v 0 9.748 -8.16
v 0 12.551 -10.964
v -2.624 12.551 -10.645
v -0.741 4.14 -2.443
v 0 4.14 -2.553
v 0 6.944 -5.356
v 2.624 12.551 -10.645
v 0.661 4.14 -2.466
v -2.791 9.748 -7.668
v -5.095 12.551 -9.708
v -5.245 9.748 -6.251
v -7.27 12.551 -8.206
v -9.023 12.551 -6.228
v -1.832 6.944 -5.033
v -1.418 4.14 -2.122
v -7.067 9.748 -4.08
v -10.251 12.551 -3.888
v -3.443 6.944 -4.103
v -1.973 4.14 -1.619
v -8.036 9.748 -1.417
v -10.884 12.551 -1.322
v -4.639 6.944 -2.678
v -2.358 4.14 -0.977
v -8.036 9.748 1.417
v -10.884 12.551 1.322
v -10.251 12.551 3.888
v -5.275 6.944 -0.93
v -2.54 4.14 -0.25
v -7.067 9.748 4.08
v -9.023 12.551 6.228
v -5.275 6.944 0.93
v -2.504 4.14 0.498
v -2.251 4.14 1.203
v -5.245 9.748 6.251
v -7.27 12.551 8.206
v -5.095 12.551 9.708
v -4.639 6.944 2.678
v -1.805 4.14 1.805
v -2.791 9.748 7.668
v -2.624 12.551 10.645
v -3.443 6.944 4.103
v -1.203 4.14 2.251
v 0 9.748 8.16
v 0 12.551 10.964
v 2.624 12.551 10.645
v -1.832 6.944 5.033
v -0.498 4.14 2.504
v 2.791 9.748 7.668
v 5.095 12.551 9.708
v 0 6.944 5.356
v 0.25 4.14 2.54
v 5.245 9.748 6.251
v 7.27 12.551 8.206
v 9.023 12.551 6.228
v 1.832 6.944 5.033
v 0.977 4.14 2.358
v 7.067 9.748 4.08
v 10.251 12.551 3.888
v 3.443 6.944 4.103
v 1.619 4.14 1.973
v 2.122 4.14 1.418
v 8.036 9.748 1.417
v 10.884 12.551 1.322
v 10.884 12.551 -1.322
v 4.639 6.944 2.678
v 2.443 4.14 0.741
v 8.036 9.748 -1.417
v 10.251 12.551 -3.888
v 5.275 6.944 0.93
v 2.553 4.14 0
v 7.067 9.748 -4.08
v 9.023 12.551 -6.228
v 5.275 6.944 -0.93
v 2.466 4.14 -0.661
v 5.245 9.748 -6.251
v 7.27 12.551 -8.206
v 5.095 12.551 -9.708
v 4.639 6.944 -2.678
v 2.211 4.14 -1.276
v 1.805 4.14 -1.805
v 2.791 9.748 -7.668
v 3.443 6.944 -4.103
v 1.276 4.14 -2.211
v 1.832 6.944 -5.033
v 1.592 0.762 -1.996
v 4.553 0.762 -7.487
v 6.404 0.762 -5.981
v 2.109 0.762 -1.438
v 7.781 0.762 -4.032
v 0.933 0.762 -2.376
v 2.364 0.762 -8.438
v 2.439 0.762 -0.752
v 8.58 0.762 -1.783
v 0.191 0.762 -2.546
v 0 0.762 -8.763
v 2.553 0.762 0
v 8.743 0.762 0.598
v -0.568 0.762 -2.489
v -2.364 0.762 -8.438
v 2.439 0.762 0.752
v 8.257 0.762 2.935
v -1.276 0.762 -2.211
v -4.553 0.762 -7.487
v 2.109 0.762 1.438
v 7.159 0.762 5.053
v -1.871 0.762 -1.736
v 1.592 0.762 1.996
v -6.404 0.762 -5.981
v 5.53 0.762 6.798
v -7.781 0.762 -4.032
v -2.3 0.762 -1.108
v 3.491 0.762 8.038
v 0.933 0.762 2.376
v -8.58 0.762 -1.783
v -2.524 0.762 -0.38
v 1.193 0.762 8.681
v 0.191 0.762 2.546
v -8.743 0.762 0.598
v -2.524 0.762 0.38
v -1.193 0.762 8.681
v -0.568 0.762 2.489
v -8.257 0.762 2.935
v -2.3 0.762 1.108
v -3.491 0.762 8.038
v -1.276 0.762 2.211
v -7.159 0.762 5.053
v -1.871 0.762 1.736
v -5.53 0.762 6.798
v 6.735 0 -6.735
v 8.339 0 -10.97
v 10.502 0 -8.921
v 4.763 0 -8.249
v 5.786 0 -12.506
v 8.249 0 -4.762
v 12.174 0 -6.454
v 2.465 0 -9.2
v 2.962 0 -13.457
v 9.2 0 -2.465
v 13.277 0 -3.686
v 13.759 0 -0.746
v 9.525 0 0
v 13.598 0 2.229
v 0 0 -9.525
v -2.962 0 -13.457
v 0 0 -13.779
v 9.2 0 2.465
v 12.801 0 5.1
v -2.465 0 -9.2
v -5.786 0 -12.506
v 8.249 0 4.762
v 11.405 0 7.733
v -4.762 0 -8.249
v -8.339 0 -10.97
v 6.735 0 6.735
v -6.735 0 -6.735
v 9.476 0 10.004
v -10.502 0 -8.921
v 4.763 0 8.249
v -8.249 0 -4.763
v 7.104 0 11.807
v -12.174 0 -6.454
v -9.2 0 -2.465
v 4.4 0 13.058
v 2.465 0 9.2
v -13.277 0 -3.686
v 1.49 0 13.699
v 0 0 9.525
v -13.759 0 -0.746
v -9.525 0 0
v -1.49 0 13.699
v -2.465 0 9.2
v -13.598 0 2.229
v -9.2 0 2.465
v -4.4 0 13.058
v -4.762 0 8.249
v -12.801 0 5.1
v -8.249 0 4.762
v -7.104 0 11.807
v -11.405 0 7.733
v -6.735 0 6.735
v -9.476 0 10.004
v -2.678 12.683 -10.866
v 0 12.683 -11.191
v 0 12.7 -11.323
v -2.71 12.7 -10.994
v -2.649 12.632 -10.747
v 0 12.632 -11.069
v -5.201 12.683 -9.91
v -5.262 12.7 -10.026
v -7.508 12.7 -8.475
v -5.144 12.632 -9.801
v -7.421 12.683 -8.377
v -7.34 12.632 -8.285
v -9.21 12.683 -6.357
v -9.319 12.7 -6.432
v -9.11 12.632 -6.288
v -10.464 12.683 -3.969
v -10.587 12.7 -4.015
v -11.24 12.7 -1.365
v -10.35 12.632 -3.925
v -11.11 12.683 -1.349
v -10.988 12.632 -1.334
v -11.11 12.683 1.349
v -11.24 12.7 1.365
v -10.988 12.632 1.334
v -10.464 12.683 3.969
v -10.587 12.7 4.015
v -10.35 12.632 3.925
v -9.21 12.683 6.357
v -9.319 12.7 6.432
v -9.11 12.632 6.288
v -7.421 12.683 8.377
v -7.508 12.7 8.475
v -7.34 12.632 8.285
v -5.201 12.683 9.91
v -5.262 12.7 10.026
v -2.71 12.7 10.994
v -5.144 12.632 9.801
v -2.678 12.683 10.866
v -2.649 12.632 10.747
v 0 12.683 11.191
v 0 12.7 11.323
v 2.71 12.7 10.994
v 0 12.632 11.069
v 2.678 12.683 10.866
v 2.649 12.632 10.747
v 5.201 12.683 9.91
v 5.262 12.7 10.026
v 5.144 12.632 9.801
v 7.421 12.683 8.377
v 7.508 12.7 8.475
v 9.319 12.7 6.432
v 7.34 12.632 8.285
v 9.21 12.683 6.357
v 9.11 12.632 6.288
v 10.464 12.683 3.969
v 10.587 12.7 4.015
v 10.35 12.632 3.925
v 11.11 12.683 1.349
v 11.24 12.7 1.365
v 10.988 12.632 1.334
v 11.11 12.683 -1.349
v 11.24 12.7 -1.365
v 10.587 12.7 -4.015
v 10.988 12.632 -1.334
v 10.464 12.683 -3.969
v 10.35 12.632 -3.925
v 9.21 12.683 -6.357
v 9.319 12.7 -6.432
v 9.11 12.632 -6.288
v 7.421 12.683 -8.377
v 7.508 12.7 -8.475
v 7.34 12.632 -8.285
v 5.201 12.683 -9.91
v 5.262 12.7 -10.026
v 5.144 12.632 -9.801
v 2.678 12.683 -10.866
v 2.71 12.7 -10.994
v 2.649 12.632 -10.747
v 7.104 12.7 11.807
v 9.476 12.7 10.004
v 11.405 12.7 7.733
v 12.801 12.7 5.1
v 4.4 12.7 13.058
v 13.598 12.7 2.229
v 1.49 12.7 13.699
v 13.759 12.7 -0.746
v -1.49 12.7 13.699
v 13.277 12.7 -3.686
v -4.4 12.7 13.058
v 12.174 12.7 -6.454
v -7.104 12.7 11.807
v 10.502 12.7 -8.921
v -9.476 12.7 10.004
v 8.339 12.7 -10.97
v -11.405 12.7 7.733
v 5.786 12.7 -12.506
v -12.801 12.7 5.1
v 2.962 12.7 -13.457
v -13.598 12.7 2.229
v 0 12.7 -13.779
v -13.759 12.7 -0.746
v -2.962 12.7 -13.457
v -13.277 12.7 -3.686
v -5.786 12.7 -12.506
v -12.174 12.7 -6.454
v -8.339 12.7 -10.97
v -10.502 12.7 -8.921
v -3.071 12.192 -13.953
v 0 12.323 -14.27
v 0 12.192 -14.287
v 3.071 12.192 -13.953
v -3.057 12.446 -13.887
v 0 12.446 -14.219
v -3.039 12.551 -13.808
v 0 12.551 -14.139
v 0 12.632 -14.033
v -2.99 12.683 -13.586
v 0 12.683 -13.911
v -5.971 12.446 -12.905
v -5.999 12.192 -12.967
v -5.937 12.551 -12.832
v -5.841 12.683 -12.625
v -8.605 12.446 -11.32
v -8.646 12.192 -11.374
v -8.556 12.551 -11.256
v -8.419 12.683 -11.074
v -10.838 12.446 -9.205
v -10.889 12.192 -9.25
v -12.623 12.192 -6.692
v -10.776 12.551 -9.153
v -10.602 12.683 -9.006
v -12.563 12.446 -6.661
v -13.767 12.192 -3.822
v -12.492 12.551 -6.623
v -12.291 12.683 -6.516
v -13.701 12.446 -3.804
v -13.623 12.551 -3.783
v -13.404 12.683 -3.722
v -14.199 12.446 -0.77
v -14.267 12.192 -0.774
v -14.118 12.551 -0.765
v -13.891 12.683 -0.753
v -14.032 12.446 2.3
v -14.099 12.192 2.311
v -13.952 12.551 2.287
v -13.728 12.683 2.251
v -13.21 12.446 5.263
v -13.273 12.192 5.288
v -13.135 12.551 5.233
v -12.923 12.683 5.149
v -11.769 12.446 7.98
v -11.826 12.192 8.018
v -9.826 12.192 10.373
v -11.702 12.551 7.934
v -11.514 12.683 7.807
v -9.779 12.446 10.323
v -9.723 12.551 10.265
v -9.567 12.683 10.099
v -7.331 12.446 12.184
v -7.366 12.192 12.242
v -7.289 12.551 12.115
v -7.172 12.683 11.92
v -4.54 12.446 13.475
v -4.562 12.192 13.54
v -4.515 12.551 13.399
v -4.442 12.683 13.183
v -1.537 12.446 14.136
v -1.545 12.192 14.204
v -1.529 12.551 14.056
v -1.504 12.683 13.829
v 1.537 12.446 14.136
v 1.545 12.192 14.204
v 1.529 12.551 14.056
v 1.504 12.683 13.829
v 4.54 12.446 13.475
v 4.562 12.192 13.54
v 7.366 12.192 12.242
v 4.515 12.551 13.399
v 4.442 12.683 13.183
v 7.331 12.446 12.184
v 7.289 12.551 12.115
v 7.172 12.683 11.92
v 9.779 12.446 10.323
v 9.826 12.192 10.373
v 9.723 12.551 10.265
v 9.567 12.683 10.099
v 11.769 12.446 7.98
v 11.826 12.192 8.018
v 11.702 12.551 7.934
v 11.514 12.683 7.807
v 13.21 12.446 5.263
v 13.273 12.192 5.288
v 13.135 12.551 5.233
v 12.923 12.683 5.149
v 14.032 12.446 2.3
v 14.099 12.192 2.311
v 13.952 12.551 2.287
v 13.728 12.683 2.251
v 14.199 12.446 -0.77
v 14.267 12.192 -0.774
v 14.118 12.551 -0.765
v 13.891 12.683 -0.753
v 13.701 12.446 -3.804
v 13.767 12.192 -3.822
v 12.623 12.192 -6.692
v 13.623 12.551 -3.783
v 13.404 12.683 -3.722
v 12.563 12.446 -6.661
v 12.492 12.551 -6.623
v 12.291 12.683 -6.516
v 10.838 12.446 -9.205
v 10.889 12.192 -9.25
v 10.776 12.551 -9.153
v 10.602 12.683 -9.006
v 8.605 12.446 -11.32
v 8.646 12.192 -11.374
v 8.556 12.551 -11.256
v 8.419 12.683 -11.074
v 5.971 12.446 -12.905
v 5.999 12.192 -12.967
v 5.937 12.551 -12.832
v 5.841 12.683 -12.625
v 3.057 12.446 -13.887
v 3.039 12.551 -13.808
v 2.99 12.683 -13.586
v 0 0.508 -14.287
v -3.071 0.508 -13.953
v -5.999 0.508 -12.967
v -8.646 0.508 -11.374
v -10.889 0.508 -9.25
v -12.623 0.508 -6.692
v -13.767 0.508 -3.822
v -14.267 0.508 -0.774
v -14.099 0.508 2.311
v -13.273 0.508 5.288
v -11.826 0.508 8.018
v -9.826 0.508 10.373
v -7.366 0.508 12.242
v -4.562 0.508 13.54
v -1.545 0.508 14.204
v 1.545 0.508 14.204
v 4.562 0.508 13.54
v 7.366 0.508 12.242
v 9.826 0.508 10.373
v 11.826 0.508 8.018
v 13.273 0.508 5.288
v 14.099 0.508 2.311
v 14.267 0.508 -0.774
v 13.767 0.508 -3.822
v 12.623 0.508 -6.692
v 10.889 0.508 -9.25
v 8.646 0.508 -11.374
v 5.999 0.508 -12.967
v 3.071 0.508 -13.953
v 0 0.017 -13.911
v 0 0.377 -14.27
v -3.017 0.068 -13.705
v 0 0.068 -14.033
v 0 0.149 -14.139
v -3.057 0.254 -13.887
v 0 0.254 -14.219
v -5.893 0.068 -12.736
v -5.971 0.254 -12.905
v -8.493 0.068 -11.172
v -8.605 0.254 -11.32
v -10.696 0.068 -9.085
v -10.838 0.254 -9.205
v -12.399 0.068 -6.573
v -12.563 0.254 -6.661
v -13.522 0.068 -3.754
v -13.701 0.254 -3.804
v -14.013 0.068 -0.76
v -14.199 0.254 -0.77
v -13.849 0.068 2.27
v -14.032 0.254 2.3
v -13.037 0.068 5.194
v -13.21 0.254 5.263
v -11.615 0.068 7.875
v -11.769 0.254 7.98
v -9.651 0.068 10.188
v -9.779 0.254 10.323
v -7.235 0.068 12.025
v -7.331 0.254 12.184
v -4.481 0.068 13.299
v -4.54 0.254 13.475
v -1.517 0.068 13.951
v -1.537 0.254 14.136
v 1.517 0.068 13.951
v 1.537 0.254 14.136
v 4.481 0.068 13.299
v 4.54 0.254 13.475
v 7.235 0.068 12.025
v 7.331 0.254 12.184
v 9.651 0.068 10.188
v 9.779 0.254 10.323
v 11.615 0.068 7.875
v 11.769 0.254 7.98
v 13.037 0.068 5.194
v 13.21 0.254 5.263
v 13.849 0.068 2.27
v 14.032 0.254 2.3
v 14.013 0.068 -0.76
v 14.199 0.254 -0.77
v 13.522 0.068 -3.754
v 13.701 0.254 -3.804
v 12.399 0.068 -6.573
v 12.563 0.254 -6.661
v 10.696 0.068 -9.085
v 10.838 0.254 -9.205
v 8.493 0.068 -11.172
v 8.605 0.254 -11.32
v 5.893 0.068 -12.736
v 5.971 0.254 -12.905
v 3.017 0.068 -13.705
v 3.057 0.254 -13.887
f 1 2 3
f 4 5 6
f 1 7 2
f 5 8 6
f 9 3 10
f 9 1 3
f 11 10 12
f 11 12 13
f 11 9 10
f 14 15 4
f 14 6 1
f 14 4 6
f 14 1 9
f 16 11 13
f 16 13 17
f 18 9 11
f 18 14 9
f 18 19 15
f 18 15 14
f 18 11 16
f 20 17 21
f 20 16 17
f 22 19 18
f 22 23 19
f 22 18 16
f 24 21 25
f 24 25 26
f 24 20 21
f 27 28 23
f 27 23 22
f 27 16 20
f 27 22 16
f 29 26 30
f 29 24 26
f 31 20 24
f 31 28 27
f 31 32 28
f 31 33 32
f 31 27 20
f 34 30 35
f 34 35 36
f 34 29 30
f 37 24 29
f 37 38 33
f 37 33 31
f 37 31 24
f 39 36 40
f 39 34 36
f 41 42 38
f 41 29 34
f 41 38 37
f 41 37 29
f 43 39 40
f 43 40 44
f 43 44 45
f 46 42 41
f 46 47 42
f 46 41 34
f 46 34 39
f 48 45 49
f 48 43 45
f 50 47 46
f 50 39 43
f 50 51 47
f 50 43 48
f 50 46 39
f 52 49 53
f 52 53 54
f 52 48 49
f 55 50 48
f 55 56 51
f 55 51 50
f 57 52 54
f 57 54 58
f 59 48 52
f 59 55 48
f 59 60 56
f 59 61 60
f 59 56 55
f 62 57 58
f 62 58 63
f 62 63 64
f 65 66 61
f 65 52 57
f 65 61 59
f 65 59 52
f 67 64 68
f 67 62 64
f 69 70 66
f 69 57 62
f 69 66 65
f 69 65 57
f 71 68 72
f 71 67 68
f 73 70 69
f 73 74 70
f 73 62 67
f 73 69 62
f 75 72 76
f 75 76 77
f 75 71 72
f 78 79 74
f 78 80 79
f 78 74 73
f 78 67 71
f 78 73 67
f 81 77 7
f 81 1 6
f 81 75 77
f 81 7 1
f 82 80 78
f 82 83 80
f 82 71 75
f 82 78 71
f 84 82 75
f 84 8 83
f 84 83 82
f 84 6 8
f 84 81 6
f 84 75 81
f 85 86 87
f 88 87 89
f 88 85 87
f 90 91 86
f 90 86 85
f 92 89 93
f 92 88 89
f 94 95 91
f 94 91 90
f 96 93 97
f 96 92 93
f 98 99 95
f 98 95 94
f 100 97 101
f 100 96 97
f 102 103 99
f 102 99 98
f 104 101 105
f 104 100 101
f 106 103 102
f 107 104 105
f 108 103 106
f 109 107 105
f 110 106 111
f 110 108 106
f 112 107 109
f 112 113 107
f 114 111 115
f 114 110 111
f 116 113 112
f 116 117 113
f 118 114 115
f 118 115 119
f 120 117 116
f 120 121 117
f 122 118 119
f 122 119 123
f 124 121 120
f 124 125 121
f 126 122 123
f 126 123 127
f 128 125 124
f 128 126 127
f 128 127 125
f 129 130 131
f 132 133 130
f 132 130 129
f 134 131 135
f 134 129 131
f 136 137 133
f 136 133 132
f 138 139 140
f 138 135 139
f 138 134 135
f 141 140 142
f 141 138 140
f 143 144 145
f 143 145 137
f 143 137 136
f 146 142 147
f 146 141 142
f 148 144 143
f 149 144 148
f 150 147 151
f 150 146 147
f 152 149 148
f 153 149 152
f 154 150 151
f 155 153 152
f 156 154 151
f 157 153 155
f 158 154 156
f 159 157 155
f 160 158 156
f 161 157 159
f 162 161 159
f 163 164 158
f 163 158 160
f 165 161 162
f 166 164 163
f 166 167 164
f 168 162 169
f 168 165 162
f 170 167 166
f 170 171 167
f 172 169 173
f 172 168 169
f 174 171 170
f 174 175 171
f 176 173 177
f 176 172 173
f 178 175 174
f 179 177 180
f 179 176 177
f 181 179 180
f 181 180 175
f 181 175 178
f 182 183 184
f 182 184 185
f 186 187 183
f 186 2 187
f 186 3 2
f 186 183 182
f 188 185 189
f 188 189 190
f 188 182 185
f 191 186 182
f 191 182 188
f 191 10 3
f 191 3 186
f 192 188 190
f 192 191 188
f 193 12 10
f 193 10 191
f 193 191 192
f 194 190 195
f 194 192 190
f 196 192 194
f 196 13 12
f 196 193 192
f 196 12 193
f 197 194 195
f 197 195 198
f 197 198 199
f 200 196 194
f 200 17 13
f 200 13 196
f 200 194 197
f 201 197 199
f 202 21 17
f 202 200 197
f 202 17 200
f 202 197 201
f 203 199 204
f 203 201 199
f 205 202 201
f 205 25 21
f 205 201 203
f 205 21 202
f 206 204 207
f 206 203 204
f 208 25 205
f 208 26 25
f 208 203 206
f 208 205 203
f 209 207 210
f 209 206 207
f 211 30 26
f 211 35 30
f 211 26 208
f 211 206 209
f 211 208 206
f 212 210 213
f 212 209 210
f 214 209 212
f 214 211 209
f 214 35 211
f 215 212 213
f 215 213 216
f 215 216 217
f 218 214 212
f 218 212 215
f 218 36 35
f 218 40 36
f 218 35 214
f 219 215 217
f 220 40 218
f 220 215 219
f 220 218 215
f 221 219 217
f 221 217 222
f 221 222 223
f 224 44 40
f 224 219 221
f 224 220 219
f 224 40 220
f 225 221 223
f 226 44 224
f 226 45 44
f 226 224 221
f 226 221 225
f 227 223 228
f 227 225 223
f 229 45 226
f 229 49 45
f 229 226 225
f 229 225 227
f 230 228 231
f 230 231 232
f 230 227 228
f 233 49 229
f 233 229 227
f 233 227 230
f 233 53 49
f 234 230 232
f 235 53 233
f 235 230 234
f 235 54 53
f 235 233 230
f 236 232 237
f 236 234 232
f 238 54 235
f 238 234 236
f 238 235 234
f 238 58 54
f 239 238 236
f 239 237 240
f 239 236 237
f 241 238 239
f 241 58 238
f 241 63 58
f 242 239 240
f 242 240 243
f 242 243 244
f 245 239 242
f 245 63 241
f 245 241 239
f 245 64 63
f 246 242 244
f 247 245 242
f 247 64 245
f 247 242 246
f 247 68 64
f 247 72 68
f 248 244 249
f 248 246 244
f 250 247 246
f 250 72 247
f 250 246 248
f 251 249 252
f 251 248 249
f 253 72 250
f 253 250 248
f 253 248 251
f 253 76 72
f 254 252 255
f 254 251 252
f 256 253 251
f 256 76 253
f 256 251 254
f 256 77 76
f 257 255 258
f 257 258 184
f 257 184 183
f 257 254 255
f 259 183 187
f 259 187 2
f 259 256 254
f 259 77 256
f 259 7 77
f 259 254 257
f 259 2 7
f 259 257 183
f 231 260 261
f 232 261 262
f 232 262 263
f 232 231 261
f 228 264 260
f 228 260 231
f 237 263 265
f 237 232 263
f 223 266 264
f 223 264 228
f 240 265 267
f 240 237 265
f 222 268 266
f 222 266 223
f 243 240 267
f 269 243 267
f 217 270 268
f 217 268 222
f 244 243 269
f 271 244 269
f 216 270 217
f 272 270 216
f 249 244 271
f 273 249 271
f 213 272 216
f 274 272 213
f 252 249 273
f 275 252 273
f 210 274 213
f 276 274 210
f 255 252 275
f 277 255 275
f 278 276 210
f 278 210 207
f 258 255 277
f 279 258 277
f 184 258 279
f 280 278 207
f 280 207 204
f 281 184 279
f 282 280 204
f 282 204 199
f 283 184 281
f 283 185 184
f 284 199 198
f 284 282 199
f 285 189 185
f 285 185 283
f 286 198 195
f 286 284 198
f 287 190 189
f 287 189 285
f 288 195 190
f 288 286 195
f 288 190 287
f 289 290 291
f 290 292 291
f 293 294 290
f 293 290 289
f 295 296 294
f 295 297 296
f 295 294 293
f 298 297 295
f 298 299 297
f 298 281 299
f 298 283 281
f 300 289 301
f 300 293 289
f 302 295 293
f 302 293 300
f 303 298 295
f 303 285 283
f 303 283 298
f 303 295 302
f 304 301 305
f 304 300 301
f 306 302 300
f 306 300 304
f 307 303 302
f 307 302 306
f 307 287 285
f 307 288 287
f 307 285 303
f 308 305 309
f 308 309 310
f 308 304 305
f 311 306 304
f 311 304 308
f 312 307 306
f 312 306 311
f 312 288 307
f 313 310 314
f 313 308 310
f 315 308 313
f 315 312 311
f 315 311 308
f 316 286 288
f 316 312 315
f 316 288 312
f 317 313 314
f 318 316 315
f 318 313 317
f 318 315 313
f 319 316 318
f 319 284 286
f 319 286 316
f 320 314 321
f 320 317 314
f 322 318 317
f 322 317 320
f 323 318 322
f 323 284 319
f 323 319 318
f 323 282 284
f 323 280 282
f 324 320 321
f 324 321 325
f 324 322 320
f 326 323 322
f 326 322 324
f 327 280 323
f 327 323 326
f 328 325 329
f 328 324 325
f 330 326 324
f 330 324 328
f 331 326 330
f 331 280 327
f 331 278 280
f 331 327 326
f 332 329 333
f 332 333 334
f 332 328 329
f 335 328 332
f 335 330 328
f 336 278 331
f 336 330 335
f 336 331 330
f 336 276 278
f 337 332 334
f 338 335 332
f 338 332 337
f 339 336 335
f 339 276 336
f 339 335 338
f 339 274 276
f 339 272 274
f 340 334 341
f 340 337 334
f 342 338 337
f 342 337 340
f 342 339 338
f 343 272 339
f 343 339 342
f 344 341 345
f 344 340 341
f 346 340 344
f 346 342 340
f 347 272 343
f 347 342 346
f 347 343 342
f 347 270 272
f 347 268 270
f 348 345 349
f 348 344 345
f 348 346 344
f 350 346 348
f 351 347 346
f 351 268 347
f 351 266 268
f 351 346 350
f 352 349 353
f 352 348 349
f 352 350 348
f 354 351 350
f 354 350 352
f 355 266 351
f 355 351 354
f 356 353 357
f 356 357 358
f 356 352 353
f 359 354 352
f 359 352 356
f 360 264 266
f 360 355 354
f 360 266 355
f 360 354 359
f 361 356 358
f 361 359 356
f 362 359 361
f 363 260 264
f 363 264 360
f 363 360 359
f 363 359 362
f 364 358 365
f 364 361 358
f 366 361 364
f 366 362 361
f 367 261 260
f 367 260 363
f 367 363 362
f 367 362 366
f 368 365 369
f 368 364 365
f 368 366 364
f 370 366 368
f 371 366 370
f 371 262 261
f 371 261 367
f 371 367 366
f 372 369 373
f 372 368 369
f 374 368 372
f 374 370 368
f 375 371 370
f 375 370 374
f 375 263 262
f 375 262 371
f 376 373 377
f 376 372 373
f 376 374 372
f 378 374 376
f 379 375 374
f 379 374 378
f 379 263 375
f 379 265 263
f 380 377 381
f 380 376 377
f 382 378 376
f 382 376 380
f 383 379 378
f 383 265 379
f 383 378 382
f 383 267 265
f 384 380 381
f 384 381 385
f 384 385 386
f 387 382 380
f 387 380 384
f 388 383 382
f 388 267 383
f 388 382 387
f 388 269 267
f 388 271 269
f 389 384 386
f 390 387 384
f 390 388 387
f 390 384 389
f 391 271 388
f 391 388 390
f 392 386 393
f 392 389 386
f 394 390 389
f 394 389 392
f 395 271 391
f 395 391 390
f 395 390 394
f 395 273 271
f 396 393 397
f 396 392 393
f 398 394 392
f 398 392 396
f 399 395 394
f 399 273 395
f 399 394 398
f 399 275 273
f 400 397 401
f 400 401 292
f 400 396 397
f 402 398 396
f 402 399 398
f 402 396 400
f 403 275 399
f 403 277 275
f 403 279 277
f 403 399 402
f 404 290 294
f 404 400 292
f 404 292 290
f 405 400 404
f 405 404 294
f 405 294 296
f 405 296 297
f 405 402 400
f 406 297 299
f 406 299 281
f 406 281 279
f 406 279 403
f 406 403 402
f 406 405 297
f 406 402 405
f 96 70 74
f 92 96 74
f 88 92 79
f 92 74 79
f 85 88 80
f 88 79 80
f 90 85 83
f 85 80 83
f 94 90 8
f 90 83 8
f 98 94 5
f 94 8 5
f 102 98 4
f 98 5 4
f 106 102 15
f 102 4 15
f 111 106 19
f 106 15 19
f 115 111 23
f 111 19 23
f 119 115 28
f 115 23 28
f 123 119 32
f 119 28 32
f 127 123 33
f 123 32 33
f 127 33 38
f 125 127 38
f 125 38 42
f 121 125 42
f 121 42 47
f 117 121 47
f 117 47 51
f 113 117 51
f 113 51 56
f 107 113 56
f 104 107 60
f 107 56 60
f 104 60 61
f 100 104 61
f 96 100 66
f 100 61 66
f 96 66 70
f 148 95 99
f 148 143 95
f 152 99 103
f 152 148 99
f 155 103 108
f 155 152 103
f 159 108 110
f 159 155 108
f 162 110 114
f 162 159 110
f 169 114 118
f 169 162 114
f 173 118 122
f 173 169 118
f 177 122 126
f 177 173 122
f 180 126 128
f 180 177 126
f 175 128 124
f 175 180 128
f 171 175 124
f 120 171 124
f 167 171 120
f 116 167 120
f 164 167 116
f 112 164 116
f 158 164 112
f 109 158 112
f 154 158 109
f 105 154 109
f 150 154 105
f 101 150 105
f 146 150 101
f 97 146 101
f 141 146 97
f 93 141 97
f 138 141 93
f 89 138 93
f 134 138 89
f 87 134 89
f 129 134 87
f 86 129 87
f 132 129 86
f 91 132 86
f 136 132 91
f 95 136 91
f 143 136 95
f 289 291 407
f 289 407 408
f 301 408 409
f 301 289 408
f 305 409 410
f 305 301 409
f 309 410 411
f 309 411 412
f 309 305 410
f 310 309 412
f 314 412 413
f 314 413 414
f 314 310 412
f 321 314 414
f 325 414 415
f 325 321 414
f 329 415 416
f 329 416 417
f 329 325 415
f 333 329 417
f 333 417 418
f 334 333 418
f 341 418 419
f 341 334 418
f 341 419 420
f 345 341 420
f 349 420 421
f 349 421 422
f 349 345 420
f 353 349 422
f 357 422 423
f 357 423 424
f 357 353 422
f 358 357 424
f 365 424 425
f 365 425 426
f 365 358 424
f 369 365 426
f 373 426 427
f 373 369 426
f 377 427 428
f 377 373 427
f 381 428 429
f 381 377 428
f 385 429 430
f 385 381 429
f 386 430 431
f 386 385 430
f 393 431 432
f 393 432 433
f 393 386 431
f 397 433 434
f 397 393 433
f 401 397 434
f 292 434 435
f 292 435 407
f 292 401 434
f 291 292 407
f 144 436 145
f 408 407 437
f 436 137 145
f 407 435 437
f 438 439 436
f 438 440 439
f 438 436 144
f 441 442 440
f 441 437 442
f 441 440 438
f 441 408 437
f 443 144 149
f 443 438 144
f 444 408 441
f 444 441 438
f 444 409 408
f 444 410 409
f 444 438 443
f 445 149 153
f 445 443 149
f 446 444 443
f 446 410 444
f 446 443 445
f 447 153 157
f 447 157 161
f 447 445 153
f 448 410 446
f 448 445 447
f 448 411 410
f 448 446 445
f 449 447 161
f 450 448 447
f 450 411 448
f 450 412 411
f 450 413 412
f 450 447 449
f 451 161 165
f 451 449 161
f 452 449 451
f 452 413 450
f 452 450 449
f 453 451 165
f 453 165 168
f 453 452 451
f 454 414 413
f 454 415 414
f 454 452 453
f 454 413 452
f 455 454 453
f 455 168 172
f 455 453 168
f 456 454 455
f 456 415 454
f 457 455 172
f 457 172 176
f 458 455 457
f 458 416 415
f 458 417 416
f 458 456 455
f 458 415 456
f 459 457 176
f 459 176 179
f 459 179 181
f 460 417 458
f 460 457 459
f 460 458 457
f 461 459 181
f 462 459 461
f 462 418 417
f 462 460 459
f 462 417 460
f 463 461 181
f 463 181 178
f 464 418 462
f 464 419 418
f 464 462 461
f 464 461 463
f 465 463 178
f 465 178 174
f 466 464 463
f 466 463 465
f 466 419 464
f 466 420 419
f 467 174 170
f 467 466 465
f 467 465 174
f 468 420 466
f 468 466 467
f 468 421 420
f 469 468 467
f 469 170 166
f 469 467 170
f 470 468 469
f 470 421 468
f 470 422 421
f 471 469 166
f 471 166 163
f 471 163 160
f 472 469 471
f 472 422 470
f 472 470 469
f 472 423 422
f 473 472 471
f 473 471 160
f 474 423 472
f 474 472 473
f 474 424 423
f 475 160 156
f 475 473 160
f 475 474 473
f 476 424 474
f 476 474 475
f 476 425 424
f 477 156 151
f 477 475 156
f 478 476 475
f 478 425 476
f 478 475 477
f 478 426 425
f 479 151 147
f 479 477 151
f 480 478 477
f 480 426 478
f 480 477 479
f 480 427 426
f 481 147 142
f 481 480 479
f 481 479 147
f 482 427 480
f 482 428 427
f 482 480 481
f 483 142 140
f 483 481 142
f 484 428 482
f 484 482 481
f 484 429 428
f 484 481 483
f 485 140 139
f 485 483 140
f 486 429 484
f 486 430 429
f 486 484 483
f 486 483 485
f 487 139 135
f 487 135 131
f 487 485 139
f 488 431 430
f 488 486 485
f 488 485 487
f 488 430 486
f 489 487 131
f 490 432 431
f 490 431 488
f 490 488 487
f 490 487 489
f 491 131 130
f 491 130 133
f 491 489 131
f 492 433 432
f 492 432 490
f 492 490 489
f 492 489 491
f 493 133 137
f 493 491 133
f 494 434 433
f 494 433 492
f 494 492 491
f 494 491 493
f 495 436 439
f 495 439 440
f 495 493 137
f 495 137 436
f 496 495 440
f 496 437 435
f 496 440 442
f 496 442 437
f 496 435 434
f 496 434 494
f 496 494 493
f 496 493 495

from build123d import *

# Parameters (mm, degrees)
FILLET1_R               = 0.508
F_1_4_20_TAPPED_HOLE1_D = 5.1054


with BuildPart() as part:
    # Sketch1 → Revolve1 (revolve)
    with BuildSketch(Plane.XY, mode=Mode.PRIVATE) as revolve1_sk:
        Polygon((0, 0.762), (8.763, 0.762), (9.525, 0), (14.2875, 0), (14.2875, 12.7), (11.1125, 12.7), (0, 1.5875), align=None)
    revolve(revolve1_sk.sketch.rotate(Axis((0, 0, 0), (0, 1, 0)), 90), axis=Axis((0, 0, 0), (0, 1, 0)))  # turned: the seam where the file's is

    # Fillet1
    fillet1_edges = [part.edges().sort_by_distance(p)[0] for p in [
        (0, 0, 14.2875),
        (0, 12.7, 14.2875),
        (0, 12.7, 11.1125),
    ]]
    fillet(fillet1_edges, radius=FILLET1_R)

    # 1_4-20 Tapped Hole1 (through all)
    with Locations(Plane(origin=(0, 0.762, 0), x_dir=(-1, 0, 0), z_dir=(0, -1, 0))):
        with Locations((0, 0)):
            Hole(F_1_4_20_TAPPED_HOLE1_D / 2)


solid = part.part
